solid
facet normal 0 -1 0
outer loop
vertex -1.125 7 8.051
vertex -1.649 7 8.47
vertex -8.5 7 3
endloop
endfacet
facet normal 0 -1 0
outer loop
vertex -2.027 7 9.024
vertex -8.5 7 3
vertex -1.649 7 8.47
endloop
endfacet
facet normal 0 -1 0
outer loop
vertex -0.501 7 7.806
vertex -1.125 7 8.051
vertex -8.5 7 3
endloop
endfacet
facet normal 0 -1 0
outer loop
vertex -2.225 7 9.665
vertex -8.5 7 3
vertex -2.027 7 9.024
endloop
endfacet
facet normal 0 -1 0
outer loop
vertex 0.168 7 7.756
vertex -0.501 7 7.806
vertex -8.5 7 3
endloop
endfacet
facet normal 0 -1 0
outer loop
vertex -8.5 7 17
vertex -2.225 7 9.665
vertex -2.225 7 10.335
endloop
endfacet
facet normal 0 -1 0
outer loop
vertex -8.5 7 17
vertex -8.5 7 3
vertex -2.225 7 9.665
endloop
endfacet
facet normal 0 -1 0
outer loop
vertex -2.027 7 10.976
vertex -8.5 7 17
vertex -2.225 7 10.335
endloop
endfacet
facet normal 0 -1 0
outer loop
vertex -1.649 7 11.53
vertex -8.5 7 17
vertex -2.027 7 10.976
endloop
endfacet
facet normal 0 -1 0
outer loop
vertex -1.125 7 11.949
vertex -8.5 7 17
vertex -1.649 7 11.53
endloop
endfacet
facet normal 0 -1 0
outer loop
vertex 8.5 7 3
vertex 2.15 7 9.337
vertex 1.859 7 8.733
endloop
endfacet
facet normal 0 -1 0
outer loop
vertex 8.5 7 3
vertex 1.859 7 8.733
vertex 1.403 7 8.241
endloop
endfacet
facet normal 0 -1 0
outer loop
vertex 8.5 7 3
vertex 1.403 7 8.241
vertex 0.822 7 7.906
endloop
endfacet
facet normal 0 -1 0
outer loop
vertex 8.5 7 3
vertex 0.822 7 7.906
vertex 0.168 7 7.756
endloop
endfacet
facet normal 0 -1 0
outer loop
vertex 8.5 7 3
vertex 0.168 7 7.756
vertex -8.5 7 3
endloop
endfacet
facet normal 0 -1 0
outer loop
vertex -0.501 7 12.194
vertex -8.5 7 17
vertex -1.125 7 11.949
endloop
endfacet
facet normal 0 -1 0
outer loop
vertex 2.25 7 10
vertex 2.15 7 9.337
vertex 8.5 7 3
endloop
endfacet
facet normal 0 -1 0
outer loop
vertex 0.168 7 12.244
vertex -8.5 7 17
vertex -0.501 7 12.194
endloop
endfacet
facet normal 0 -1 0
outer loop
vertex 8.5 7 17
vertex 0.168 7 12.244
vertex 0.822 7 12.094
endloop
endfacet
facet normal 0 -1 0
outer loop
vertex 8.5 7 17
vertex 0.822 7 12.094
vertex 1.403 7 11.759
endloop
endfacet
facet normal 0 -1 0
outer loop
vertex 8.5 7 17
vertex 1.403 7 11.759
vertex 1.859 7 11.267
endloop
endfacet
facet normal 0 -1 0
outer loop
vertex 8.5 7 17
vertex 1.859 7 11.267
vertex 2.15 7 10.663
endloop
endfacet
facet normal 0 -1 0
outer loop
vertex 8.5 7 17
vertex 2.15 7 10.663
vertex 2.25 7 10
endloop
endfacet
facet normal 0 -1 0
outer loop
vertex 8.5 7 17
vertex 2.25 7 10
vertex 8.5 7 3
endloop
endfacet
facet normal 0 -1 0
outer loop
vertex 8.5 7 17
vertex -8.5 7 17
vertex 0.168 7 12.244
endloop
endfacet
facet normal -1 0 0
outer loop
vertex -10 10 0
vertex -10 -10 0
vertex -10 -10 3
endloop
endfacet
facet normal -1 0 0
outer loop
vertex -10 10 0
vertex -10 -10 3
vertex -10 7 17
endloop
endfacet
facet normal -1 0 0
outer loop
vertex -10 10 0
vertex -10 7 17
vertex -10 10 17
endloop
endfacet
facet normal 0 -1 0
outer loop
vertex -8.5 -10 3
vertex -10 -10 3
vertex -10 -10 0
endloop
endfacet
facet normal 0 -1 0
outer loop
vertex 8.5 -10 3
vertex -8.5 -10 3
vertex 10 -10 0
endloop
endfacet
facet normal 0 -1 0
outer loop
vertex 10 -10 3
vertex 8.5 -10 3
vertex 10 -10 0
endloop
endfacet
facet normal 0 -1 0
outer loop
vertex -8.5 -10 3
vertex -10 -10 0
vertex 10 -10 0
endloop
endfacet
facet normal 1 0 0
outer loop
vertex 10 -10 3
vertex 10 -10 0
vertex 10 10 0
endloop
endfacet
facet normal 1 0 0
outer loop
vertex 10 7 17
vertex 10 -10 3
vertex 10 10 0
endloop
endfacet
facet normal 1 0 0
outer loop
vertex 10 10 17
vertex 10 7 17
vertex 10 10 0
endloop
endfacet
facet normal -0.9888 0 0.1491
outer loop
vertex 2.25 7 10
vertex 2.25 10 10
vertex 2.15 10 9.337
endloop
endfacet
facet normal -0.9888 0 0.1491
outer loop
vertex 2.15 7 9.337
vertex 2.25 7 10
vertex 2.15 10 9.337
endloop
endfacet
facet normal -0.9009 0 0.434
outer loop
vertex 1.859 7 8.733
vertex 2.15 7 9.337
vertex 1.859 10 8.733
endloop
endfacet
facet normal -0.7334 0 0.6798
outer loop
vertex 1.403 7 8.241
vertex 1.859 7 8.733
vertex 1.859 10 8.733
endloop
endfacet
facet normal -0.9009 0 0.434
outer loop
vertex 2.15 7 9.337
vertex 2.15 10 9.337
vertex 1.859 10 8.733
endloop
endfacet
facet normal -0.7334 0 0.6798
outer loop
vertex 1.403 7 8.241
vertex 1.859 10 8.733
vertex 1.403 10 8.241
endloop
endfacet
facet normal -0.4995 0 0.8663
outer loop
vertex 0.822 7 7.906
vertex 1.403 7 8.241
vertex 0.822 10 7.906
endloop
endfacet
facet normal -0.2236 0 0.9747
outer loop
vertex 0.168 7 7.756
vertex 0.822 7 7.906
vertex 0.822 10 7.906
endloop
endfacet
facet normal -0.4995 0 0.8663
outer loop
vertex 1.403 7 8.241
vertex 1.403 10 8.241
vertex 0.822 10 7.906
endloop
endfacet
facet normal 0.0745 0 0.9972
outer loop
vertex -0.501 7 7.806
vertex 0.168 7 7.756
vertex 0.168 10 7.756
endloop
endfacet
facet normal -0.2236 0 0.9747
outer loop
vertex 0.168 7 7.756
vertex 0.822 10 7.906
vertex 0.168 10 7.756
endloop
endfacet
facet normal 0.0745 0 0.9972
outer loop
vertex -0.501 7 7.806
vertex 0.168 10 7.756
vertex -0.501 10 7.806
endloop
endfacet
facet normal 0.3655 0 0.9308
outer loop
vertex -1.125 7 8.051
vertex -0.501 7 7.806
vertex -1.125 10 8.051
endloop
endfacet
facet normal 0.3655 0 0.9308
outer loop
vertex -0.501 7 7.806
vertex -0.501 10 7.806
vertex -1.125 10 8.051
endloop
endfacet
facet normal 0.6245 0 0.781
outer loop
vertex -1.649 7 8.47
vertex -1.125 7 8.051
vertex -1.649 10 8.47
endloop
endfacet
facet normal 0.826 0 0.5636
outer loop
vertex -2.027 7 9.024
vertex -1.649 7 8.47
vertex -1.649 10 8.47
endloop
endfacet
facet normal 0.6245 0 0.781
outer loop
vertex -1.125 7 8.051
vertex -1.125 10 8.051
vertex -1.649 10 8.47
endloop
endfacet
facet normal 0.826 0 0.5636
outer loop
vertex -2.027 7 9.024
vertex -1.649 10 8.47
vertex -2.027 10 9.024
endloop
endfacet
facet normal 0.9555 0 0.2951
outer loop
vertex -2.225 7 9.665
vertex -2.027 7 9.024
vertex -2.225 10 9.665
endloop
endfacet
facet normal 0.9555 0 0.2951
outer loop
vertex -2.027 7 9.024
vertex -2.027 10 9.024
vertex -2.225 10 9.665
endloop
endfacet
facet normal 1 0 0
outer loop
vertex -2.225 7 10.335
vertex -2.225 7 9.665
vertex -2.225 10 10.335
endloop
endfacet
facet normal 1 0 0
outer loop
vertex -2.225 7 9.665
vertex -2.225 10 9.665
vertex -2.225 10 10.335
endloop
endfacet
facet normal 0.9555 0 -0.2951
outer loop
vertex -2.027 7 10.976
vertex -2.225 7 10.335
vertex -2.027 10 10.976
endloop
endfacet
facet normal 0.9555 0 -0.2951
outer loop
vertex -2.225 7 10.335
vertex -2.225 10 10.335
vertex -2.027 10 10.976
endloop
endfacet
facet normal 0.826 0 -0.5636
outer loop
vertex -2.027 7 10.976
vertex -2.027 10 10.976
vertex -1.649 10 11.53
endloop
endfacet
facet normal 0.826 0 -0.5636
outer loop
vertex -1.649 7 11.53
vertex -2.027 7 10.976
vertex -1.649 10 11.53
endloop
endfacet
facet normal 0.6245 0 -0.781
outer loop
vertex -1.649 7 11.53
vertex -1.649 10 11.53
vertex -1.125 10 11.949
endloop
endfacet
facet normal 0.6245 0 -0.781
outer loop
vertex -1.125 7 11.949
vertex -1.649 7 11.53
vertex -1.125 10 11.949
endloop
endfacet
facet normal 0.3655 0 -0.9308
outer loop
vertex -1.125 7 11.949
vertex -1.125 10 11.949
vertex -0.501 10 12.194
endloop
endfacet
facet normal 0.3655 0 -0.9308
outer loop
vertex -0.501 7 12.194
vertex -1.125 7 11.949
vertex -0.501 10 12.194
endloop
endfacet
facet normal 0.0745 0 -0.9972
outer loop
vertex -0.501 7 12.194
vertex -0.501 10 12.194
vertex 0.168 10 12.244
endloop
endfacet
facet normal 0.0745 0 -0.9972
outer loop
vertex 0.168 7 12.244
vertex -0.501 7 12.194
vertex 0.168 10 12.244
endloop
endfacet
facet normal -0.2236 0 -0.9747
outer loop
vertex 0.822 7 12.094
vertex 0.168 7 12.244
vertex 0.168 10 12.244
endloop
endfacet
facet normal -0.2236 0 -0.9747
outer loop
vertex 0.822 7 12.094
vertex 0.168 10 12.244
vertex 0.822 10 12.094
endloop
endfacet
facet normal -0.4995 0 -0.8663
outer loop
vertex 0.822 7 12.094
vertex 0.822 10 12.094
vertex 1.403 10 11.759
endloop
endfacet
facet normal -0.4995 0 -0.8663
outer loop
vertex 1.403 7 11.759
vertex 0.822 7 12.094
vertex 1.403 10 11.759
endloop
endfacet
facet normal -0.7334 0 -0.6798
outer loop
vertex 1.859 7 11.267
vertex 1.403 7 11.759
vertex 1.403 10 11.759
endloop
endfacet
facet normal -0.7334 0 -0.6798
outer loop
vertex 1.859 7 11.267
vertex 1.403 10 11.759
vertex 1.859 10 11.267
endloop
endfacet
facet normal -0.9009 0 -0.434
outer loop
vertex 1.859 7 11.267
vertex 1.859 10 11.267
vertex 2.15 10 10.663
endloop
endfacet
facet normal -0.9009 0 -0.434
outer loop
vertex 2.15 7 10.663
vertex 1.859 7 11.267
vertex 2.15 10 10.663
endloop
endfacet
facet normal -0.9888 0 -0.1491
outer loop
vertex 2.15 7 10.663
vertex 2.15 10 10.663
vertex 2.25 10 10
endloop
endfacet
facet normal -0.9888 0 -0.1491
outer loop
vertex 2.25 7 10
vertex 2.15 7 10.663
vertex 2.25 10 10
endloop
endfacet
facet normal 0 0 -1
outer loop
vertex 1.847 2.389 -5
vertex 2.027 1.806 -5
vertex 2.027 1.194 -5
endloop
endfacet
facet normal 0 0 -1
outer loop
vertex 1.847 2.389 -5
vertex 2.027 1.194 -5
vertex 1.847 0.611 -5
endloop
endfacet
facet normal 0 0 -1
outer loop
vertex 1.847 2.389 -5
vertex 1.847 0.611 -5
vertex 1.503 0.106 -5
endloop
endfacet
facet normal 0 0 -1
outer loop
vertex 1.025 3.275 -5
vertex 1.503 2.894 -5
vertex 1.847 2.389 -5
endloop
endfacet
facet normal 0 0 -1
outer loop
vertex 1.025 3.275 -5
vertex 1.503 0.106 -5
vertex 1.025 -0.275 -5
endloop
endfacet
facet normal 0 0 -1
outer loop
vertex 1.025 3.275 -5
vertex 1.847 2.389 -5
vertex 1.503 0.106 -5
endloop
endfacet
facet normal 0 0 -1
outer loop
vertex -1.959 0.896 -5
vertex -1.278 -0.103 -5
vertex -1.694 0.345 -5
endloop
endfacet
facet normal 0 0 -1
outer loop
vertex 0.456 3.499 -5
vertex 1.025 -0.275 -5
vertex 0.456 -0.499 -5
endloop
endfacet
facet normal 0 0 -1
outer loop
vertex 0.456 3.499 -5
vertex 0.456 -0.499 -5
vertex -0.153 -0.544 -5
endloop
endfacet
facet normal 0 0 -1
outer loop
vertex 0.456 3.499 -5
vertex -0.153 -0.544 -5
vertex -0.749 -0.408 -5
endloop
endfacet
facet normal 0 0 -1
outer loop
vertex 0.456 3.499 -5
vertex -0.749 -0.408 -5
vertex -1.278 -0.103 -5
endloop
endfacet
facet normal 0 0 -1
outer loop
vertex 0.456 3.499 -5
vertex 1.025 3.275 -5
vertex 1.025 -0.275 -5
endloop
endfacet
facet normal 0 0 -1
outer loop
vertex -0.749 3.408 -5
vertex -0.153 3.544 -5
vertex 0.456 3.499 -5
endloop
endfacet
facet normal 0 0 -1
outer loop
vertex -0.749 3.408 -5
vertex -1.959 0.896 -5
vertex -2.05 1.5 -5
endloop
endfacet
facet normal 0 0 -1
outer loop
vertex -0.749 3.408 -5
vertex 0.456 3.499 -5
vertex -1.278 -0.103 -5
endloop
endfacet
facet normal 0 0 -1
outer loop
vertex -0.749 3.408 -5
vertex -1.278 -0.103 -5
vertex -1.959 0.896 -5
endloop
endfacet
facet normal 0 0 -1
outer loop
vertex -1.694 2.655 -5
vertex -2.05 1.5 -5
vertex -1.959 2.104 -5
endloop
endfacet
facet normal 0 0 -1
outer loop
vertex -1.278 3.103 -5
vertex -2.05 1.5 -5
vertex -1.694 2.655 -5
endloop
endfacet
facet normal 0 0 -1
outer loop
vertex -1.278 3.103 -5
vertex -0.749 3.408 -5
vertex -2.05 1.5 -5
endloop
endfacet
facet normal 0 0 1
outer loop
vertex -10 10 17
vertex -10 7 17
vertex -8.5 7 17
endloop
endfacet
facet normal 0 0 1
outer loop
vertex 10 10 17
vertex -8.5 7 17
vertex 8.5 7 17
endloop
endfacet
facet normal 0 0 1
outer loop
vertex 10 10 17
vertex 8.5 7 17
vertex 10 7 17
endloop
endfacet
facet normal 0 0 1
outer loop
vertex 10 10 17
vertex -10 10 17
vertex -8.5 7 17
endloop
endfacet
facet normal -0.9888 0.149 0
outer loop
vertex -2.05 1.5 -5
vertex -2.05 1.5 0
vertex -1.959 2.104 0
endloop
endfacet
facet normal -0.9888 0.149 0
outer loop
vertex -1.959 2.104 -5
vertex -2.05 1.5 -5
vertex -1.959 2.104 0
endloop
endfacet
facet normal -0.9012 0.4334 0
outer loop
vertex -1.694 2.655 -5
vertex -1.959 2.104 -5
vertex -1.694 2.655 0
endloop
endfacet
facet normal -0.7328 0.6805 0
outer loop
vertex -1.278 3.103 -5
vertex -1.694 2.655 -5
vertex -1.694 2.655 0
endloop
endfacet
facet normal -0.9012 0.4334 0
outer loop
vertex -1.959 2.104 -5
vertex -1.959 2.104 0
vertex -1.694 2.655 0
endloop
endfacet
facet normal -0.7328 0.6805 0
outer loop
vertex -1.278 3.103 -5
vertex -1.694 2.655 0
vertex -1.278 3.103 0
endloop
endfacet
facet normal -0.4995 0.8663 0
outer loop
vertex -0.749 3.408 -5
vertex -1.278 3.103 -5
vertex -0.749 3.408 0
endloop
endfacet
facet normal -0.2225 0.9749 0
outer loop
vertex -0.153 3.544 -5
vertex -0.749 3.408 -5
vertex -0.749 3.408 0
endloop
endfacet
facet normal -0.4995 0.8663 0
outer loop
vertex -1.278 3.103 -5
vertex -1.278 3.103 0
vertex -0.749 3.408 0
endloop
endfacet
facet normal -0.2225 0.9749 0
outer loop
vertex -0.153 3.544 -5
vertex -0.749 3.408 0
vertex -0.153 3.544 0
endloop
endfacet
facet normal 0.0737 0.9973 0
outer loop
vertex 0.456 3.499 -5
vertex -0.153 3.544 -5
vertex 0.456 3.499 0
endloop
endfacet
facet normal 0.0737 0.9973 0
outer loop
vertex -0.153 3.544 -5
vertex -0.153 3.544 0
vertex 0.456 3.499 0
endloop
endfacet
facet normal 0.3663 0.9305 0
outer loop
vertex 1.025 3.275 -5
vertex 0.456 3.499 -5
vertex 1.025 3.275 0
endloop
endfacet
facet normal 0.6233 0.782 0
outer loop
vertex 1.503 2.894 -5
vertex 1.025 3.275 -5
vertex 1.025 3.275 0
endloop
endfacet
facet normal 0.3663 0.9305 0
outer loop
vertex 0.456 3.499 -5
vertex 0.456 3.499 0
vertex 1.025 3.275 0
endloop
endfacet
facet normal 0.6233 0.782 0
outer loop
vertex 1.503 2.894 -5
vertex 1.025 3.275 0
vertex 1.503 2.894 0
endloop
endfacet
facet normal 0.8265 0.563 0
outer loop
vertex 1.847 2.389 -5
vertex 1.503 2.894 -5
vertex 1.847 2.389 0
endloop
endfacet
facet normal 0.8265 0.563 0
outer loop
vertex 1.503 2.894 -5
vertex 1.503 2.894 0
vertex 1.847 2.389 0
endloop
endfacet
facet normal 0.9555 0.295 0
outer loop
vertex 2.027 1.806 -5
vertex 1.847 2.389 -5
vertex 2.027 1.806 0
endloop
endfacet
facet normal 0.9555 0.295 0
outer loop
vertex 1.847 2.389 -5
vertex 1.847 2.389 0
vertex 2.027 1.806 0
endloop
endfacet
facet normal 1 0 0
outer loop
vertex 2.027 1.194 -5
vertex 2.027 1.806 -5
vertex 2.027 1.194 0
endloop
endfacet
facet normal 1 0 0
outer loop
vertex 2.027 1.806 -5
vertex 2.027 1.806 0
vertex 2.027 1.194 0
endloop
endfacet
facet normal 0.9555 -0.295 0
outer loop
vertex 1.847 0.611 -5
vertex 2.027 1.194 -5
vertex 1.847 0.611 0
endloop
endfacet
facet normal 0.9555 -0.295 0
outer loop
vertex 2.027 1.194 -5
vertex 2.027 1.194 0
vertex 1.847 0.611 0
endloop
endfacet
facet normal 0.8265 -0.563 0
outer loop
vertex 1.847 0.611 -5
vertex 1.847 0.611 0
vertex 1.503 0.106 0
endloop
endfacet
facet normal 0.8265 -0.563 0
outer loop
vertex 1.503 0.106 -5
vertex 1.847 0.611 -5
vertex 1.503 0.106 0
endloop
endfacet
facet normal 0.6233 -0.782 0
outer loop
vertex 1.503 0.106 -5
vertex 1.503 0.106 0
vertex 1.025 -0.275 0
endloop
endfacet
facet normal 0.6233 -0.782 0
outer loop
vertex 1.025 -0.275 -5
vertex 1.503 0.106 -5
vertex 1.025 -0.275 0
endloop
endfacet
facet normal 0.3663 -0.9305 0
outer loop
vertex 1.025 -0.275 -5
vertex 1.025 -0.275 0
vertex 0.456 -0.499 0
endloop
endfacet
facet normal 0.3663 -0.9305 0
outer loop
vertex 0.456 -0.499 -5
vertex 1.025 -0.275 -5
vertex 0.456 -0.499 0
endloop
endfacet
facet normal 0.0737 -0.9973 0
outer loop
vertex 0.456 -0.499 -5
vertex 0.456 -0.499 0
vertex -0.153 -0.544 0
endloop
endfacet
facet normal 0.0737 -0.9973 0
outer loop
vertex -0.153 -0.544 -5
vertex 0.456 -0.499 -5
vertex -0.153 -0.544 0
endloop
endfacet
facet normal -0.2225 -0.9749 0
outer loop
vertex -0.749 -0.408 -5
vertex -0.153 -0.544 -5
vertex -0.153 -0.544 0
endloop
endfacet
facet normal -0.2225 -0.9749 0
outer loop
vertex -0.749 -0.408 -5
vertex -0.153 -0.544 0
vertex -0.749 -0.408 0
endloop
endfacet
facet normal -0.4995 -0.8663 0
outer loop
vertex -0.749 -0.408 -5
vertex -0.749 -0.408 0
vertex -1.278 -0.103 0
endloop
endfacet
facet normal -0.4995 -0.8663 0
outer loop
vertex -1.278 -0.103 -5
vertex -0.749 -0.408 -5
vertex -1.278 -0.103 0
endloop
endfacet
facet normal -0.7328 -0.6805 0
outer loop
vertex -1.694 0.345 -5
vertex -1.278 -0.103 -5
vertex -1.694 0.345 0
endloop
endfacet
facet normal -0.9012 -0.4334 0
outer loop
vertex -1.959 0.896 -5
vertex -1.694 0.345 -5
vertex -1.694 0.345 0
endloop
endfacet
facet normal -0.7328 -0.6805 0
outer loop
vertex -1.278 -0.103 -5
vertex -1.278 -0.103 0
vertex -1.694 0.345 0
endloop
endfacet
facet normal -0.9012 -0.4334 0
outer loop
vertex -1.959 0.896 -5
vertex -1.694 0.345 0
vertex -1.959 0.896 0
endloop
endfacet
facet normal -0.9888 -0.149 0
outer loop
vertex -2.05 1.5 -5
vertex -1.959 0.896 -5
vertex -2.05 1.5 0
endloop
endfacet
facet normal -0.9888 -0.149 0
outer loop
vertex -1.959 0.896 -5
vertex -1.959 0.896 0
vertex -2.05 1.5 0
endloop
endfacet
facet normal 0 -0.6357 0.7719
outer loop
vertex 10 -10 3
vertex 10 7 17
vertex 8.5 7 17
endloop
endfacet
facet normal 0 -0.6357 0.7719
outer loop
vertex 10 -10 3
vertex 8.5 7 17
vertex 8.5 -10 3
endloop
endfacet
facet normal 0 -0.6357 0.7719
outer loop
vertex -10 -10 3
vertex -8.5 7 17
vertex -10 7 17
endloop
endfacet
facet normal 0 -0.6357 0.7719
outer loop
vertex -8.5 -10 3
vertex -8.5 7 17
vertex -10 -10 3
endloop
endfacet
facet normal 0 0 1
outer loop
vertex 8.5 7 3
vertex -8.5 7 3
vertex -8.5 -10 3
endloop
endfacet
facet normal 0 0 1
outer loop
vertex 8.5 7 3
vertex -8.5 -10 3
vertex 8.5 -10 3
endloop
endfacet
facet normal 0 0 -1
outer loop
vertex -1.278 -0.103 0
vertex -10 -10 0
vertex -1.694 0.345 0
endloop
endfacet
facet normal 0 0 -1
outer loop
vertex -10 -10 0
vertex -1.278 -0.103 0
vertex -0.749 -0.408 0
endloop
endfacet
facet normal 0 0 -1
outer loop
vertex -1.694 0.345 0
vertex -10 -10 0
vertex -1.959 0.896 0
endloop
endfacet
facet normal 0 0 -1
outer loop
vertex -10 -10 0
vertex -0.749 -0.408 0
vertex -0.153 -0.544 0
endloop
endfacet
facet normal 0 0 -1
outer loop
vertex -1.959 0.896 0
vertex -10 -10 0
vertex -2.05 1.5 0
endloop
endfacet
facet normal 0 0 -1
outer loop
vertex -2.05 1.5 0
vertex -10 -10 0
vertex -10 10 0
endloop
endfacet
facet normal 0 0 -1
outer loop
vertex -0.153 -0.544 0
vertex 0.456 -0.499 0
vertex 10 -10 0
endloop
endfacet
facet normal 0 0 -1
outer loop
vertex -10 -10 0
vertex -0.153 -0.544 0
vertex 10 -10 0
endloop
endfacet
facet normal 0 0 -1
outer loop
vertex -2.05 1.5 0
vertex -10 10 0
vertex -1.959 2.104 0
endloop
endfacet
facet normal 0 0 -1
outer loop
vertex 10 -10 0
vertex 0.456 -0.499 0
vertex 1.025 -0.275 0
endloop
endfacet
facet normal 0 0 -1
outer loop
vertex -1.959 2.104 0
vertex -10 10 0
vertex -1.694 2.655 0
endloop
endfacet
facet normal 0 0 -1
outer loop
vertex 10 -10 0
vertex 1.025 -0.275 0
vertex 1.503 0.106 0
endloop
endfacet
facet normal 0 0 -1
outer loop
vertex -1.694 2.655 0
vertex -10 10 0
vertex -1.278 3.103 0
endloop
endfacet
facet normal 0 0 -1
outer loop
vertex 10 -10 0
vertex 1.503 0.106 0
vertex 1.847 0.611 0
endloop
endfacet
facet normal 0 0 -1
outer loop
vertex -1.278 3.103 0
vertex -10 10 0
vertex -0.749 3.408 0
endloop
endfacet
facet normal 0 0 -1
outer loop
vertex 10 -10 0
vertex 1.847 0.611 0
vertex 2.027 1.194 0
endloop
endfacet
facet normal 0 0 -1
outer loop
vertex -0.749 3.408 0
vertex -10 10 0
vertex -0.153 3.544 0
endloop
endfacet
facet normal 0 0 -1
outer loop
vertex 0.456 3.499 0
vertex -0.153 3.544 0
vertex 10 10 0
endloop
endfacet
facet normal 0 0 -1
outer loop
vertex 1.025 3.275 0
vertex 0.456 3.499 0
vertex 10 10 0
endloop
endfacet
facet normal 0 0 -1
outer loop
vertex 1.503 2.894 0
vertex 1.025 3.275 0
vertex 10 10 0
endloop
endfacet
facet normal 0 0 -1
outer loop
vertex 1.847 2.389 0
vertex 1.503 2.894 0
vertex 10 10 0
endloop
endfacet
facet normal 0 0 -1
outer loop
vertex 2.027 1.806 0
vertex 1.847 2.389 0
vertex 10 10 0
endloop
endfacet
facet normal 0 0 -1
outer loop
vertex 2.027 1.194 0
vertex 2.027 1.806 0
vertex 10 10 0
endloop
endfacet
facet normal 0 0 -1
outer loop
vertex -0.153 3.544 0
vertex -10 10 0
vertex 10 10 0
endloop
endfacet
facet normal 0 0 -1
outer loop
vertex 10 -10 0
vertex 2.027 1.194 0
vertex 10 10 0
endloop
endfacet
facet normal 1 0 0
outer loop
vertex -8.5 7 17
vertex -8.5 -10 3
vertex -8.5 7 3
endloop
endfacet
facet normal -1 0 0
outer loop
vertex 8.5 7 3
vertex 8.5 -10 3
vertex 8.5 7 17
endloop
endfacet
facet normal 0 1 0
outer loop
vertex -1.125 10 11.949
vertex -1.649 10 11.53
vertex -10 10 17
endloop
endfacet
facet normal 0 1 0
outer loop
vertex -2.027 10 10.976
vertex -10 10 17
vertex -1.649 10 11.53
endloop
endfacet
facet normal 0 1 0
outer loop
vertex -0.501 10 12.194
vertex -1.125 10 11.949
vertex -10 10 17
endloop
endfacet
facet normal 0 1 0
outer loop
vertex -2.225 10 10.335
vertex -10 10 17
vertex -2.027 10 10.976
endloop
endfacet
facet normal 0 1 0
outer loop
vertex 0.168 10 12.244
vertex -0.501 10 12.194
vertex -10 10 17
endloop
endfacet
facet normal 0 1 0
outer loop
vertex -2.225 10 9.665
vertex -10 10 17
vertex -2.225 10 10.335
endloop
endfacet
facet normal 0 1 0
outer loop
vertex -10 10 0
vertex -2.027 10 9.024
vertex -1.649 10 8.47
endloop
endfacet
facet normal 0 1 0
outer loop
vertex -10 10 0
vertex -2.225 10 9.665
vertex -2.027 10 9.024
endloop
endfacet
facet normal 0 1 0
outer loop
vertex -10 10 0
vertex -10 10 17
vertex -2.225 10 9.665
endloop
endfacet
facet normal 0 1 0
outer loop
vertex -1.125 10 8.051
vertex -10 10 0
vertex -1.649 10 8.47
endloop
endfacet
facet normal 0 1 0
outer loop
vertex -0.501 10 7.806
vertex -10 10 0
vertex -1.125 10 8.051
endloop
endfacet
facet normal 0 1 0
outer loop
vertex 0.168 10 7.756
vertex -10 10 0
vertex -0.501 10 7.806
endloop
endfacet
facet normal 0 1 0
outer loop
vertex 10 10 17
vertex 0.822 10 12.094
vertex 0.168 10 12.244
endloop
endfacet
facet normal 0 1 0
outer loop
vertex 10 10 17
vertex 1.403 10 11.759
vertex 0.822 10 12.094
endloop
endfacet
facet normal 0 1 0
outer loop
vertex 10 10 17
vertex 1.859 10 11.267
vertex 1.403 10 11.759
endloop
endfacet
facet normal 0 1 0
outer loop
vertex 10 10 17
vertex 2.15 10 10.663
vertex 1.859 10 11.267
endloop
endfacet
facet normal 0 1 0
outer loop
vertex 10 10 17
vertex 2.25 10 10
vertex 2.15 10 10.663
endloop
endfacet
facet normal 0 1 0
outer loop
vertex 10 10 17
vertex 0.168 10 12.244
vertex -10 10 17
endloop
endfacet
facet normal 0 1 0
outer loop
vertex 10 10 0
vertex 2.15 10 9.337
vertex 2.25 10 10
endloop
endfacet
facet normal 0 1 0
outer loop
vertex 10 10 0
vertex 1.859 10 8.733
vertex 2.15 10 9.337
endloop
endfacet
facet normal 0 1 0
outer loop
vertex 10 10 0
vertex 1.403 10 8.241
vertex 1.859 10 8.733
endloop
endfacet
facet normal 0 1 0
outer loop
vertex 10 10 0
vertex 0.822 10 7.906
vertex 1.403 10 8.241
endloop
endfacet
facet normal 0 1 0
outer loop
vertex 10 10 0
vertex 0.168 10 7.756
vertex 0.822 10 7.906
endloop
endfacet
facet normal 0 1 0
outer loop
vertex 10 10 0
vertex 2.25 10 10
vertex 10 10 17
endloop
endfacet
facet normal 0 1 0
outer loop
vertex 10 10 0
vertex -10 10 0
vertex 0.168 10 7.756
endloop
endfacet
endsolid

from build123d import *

# Parameters (mm, degrees)
SKETCH_1_W          = 20
SKETCH_1_H          = 20
EXTRUDE_1_DEPTH     = 17
CUT_EXTRUDE_1_DEPTH = 20
SKETCH_3_W          = 17
SKETCH_3_H          = 17
CUT_EXTRUDE_2_DEPTH = 14
HOLE_WIZARD_M4_1_D  = 4.5
SKETCH_9_R          = 2.05
EXTRUDE_3_DEPTH     = 5


with BuildPart() as part:
    # 스케치1 → 보스-돌출1 (new body)
    with BuildSketch(Plane.XY):
        Rectangle(SKETCH_1_W, SKETCH_1_H)
    extrude(amount=EXTRUDE_1_DEPTH)

    # 스케치2 → 컷-돌출1 (cut)
    with BuildSketch(Plane(origin=(10, 0, 0), x_dir=(0, 0, -1), z_dir=(1, 0, 0))):
        Polygon((-17, 7), (-3, -10), (-17, -10), align=None)
    extrude(amount=-CUT_EXTRUDE_1_DEPTH, mode=Mode.SUBTRACT)

    # 스케치3 → 컷-돌출2 (cut)
    with BuildSketch(Plane.XY.offset(17)):
        with Locations((0, -1.5)):
            Rectangle(SKETCH_3_W, SKETCH_3_H)
    extrude(amount=-CUT_EXTRUDE_2_DEPTH, mode=Mode.SUBTRACT)

    # M4 여유 구멍1 (through all)
    with Locations(Plane(origin=(0, 7, 0), x_dir=(-1, 0, 0), z_dir=(0, -1, 0))):
        with Locations((0, -10)):
            Hole(HOLE_WIZARD_M4_1_D / 2)

    # 스케치9 → 보스-돌출3 (add)
    with BuildSketch(Plane(origin=(0, 0, 0), x_dir=(-1, 0, 0), z_dir=(0, 0, -1))):
        with Locations((0, 1.5)):
            Circle(SKETCH_9_R)
    extrude(amount=EXTRUDE_3_DEPTH)


solid = part.part
